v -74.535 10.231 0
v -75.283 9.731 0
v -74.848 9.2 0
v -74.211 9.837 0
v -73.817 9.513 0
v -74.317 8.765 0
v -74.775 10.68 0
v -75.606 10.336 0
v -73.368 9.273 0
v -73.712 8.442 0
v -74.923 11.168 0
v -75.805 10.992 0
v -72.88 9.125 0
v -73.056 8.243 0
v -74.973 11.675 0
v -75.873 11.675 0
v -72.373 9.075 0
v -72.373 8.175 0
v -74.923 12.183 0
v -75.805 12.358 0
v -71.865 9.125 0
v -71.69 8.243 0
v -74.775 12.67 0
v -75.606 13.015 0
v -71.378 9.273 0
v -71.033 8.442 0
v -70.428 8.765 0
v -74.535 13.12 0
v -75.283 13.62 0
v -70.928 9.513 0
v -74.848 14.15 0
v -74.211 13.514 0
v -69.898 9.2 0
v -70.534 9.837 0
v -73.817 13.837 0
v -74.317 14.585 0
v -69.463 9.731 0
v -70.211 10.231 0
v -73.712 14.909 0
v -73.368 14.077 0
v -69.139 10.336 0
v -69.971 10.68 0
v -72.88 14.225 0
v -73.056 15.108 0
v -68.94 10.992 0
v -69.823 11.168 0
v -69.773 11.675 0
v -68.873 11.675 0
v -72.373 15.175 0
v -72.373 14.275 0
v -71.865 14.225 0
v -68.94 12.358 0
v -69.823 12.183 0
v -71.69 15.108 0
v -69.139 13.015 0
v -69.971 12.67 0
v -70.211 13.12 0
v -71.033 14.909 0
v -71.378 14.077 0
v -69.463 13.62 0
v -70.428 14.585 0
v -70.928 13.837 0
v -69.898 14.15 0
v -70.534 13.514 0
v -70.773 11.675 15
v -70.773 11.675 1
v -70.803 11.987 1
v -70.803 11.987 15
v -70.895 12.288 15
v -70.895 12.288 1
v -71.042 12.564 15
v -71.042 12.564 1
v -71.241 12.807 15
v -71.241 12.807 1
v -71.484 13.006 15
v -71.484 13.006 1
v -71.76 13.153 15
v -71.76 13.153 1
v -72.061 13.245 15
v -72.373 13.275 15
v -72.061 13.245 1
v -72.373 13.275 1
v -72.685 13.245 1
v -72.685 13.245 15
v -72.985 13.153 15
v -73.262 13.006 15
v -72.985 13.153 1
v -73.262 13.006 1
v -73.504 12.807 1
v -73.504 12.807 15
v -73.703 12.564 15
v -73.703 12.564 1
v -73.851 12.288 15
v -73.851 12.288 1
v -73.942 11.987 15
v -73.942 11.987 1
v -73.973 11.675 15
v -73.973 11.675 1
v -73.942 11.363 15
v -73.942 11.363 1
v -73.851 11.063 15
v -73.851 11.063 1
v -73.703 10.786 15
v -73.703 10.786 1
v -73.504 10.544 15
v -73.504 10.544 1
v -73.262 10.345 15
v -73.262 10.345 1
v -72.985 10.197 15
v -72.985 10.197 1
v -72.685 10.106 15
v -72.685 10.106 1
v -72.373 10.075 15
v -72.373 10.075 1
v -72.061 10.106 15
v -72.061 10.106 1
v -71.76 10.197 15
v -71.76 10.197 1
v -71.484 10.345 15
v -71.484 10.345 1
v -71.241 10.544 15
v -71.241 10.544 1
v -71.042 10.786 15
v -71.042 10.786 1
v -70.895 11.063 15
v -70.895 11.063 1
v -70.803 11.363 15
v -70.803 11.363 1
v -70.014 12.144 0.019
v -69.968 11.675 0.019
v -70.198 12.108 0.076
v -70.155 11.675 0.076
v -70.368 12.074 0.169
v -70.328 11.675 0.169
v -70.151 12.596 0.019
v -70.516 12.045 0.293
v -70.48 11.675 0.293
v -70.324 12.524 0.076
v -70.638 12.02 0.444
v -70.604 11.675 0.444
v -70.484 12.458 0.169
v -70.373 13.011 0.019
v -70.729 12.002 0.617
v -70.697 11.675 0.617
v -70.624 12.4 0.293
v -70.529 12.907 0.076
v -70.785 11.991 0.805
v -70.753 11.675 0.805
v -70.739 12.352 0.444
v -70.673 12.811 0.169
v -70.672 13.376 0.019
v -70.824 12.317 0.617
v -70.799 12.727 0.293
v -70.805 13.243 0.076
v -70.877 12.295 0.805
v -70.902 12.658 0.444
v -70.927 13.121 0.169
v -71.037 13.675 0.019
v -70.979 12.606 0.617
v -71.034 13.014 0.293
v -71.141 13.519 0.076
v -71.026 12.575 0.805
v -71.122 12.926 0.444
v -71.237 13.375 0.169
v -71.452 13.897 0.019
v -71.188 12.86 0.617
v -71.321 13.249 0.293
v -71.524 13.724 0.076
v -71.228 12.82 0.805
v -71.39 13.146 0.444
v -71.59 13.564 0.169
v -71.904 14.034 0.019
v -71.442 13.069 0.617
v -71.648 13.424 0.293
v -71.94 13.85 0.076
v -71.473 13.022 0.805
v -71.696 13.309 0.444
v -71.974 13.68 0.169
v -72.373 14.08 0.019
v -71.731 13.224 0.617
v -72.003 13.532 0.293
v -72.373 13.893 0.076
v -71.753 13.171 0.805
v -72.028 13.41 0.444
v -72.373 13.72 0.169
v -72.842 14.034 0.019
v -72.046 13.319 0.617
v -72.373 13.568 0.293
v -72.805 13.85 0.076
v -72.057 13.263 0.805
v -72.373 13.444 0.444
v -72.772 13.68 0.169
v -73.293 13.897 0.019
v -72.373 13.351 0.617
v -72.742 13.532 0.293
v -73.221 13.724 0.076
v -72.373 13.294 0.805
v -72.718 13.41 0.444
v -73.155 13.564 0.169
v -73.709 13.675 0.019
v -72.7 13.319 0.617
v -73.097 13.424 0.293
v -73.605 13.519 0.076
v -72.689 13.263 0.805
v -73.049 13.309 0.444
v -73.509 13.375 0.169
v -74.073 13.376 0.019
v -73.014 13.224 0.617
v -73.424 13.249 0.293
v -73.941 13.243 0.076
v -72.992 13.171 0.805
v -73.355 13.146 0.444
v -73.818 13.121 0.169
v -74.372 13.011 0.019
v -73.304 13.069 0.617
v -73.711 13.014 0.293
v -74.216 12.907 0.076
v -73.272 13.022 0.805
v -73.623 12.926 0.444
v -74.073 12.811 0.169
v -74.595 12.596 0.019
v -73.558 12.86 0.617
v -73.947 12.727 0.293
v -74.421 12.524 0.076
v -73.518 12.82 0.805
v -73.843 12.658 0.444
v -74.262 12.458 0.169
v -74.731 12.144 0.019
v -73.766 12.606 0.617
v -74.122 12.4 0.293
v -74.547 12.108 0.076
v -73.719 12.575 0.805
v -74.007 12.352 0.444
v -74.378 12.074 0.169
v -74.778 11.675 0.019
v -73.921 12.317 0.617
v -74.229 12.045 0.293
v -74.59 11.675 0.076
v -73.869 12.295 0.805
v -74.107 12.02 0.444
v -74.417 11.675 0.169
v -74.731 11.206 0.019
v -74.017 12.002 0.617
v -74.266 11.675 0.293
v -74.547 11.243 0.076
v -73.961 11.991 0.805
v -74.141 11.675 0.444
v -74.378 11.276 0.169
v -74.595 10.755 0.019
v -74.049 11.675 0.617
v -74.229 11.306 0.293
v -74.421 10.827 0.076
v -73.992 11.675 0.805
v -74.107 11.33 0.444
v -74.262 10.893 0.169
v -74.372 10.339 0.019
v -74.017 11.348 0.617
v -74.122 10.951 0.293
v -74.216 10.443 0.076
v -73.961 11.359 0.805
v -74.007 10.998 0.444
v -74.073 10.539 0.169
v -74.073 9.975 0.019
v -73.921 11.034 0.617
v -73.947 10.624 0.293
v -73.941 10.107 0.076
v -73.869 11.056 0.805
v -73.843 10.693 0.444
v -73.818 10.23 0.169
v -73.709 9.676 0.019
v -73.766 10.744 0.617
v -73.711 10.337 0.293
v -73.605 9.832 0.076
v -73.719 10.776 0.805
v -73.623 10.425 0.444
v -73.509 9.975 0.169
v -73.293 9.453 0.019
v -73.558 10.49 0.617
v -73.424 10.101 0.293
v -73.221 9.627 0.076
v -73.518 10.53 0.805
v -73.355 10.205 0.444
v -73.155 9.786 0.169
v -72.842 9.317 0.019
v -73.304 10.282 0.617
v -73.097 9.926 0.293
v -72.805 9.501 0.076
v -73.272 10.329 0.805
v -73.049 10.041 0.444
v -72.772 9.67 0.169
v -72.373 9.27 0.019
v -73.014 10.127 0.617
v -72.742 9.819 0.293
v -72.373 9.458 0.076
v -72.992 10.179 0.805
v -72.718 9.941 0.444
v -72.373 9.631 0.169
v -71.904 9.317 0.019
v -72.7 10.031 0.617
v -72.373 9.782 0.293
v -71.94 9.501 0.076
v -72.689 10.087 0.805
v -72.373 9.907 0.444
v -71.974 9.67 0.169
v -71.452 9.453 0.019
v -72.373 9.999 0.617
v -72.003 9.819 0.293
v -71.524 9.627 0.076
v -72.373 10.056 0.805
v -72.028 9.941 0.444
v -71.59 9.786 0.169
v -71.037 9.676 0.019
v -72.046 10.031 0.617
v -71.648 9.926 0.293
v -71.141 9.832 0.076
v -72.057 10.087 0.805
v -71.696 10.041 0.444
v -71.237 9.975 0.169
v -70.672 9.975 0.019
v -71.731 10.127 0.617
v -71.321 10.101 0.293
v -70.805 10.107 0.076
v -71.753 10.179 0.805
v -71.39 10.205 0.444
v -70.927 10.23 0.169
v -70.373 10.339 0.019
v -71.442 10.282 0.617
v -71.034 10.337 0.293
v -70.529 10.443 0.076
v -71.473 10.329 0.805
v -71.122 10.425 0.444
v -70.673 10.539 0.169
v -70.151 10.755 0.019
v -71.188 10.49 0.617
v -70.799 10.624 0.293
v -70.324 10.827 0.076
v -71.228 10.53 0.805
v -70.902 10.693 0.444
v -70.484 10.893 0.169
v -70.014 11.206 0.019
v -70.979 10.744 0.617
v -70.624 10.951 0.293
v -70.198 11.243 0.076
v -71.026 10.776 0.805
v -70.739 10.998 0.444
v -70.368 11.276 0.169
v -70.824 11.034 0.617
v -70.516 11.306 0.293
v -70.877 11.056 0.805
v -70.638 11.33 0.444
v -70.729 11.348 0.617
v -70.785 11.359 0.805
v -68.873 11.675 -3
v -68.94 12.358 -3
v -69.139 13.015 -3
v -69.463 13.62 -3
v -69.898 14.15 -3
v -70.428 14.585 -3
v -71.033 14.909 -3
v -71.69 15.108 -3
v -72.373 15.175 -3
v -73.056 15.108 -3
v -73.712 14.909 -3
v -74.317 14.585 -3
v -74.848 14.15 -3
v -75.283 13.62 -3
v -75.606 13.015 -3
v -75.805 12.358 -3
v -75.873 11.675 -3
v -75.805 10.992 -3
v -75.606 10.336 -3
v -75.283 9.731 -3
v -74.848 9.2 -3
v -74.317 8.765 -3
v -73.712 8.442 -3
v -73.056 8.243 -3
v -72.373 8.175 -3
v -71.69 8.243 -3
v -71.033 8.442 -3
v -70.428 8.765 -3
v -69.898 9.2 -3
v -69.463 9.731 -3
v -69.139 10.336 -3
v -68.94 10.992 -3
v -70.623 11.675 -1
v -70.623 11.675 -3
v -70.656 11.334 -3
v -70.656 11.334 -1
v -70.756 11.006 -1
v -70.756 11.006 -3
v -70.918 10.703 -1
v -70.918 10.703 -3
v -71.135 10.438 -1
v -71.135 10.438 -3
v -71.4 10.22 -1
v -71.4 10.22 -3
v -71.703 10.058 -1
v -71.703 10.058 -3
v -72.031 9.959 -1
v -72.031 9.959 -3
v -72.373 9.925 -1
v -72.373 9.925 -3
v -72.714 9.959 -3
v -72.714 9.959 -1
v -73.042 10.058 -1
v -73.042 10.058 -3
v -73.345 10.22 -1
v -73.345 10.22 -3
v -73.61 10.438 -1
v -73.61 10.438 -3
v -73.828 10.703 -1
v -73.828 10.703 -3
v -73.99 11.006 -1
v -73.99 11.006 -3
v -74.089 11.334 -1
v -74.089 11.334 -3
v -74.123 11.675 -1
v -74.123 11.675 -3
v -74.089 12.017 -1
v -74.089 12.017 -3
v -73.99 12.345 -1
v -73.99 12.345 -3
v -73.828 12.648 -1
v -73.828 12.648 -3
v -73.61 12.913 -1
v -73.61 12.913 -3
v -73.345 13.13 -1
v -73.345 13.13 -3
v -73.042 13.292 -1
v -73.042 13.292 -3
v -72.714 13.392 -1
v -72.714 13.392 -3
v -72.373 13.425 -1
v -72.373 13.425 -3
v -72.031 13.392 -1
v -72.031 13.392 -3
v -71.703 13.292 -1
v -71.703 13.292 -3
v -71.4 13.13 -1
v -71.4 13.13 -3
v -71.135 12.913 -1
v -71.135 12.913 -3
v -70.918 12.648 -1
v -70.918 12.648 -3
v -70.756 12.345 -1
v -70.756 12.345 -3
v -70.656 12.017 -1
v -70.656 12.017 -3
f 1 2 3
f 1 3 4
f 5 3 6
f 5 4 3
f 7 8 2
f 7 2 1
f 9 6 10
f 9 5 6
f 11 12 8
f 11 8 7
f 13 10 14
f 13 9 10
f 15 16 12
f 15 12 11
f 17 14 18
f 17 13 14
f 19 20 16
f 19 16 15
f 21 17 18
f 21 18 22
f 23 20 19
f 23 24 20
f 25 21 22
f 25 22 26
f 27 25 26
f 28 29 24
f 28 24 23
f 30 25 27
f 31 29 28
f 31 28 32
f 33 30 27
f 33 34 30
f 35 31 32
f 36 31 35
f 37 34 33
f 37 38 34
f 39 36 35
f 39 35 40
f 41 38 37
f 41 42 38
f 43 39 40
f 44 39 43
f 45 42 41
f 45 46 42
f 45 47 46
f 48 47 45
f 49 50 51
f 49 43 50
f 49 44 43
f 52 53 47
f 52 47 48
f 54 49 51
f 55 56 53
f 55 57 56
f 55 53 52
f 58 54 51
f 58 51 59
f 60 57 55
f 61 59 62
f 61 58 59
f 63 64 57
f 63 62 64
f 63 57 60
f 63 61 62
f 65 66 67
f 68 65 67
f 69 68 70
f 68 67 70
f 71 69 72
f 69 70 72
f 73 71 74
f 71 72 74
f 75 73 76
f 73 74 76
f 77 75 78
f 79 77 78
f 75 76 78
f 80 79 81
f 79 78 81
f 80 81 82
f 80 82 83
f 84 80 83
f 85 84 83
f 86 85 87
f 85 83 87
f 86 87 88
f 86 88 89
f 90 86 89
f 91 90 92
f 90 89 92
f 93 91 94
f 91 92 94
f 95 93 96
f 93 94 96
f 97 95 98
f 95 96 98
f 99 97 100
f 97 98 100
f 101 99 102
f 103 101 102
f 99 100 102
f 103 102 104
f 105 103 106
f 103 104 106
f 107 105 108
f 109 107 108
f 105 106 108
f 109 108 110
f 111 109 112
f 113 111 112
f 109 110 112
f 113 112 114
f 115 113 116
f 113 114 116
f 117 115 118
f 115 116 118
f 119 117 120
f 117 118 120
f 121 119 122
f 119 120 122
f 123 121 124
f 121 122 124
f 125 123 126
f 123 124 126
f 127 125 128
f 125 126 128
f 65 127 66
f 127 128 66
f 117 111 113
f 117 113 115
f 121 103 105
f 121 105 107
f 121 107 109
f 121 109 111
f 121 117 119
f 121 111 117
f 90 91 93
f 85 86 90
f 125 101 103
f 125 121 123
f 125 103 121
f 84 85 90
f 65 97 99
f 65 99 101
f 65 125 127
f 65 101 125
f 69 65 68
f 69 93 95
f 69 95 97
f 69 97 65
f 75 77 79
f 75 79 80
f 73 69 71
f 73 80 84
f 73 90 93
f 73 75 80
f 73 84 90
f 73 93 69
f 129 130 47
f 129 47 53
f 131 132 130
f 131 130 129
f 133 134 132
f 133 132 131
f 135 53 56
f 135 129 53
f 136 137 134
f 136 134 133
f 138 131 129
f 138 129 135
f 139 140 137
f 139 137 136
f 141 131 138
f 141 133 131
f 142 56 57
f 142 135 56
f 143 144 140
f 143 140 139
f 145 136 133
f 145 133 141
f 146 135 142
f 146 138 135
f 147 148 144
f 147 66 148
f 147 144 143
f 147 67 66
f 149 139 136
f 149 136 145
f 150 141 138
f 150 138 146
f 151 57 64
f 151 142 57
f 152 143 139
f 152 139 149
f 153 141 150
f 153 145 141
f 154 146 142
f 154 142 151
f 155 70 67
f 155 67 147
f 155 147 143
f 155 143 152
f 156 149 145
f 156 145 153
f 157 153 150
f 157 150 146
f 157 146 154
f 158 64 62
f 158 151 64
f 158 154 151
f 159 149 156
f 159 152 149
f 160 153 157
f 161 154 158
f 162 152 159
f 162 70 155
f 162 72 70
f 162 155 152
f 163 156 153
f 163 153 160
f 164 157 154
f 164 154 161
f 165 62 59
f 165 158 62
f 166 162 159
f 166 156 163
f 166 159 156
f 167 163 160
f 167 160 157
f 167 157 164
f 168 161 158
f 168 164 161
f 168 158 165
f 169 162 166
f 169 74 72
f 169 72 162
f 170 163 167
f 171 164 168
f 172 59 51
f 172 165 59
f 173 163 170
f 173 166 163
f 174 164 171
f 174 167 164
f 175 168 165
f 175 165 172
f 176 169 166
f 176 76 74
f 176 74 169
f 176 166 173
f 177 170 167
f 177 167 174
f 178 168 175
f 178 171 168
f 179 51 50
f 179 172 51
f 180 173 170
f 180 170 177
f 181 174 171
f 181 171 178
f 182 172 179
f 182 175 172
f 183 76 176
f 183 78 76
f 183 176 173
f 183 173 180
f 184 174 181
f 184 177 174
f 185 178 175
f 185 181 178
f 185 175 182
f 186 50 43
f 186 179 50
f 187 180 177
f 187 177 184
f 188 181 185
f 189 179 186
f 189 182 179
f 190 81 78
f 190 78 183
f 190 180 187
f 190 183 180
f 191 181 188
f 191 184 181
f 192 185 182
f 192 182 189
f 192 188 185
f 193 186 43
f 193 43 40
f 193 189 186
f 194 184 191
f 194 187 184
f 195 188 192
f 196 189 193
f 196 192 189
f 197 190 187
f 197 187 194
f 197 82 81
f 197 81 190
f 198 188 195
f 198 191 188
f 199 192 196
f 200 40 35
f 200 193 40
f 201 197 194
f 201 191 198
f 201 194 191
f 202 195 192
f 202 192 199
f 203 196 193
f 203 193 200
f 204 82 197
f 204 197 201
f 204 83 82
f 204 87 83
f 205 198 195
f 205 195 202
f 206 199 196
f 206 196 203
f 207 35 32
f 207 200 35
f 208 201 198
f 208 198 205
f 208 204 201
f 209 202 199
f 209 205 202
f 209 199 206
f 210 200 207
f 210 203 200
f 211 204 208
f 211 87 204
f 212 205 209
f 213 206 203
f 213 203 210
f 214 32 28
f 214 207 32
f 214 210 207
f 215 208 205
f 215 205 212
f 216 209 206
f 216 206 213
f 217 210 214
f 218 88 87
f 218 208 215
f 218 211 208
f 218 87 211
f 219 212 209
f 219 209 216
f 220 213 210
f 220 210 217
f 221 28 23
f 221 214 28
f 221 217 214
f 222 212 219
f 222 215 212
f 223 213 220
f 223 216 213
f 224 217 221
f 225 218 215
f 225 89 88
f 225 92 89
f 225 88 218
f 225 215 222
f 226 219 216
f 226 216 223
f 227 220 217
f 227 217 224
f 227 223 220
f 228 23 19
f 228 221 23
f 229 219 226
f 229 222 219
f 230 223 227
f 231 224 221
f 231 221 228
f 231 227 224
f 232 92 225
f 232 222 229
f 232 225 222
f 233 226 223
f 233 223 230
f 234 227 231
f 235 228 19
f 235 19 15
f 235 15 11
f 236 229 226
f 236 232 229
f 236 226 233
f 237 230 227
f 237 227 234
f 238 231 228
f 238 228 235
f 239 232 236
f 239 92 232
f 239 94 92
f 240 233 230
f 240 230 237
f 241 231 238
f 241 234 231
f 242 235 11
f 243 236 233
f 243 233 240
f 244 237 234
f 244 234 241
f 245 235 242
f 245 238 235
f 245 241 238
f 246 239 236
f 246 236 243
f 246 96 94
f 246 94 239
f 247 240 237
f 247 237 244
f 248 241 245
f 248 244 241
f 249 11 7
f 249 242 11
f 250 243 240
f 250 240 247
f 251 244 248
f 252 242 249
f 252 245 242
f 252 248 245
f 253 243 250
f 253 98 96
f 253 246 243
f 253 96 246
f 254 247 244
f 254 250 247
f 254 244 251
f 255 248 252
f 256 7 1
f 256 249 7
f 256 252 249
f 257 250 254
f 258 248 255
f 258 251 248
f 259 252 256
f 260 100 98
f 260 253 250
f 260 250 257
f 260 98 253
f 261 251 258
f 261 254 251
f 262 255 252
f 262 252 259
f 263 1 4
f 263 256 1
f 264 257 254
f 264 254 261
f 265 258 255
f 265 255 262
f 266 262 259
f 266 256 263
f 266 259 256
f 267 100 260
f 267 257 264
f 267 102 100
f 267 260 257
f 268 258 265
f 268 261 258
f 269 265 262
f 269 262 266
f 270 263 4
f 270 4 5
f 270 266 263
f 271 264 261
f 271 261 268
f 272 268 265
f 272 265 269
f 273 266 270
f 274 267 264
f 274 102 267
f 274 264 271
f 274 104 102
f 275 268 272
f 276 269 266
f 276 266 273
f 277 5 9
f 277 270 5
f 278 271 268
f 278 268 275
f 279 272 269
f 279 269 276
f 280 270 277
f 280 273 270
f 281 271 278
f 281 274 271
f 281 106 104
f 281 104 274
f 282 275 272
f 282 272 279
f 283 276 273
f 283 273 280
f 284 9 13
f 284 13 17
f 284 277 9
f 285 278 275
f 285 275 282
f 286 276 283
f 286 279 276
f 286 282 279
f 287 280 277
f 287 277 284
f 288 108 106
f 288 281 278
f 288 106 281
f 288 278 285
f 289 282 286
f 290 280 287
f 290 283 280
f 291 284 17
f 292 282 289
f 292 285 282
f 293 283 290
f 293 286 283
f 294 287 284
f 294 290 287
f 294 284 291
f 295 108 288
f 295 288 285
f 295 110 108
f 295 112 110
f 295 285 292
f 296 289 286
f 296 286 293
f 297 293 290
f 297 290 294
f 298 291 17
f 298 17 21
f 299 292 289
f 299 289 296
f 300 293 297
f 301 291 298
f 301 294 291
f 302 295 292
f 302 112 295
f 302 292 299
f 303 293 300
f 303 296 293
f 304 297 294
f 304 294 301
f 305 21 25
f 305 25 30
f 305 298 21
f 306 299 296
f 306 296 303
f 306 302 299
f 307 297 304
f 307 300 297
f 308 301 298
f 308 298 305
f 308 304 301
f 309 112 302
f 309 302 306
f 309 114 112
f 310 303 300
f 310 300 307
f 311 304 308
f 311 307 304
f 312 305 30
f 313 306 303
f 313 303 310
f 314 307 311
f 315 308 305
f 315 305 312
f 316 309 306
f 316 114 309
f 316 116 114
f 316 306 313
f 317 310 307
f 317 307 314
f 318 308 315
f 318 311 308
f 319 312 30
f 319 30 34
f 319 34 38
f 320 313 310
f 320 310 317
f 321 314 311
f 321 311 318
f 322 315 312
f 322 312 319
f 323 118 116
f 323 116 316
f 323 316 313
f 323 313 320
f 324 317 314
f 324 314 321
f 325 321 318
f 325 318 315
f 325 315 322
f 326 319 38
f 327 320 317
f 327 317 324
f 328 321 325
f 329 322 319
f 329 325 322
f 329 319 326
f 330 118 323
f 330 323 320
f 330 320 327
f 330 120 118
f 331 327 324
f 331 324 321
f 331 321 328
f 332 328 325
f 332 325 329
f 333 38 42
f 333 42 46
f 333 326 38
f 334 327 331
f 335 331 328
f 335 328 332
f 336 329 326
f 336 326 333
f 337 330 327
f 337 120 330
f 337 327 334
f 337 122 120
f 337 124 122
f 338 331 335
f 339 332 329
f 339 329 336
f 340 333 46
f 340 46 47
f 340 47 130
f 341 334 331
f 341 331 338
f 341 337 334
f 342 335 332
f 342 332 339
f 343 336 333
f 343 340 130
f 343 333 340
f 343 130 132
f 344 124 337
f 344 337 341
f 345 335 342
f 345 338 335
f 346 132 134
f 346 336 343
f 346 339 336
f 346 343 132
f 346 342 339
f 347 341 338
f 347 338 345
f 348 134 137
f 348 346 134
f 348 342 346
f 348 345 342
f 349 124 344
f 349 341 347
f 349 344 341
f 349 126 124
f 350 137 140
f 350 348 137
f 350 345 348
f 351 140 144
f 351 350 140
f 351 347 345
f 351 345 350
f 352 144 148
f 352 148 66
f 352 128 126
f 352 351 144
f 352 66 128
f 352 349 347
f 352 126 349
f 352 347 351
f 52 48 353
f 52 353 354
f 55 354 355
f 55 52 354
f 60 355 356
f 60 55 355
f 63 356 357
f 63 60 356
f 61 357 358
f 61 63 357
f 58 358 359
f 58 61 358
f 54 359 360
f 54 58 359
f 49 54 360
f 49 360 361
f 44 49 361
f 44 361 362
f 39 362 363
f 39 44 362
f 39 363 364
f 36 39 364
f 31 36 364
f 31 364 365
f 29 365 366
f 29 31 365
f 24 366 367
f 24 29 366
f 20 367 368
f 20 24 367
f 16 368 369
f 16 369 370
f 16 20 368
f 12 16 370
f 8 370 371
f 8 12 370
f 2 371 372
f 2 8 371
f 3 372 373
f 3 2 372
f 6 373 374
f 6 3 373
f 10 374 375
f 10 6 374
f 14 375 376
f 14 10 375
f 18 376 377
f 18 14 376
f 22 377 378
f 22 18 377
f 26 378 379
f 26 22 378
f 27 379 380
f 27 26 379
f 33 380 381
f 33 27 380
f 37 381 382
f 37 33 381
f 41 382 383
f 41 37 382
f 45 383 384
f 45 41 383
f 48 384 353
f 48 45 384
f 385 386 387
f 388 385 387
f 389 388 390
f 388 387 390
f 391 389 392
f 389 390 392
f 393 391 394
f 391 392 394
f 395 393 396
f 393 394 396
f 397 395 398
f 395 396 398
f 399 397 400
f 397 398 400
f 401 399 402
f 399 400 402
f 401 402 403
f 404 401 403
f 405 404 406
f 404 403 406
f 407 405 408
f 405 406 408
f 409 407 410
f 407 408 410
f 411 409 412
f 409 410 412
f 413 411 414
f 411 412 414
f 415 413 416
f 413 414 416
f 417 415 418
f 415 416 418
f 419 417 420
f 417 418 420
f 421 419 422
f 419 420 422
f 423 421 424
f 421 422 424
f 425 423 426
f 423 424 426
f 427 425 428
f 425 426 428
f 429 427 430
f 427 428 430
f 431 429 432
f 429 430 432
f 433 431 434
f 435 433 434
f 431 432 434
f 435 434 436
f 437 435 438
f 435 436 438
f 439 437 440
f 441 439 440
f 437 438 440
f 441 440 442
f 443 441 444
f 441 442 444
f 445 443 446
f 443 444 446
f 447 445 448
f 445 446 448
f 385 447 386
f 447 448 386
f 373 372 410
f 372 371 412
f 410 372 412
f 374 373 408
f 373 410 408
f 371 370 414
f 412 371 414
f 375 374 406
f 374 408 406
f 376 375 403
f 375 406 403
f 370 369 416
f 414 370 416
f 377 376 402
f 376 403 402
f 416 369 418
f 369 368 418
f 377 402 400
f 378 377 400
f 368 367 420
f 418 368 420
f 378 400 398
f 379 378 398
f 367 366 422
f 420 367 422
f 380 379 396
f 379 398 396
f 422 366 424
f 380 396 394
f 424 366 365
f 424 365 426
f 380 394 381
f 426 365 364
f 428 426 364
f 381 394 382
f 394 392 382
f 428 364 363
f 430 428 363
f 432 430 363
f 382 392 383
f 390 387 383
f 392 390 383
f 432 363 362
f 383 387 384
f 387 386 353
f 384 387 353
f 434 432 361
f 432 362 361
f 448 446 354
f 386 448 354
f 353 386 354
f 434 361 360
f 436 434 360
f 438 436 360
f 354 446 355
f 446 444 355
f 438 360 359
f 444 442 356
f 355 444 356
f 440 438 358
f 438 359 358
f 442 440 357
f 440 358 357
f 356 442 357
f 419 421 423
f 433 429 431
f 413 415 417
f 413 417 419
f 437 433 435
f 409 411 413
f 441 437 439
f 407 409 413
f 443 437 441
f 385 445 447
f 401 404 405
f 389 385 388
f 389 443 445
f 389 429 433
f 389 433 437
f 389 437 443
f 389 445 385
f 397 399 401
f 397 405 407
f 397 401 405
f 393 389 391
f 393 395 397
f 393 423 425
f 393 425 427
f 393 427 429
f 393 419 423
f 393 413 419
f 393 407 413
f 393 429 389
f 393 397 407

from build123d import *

# Parameters (mm, degrees)
SKETCH020_R     = 1.6
PAD015_DEPTH    = 15
SKETCH021_R     = 3.5
PAD016_DEPTH    = 3
SKETCH022_R     = 1.75
POCKET003_DEPTH = 2
FILLET002_R     = 1


with BuildPart() as part:
    # Sketch020 → Pad015 (new body)
    with BuildSketch(Plane.XY):
        with Locations((-72.372711, 11.675275)):
            Circle(SKETCH020_R)
    extrude(amount=PAD015_DEPTH)

    # Sketch021 → Pad016 (join)
    with BuildSketch(Plane.XY):
        with Locations((-72.372711, 11.675275)):
            Circle(SKETCH021_R)
    extrude(amount=-PAD016_DEPTH)

    # Sketch022 (on Face3 of Pad016) → Pocket003 (cut)
    with BuildSketch(Plane(origin=(0, 0, -3), x_dir=(1, 0, 0), z_dir=(0, 0, -1))):
        with Locations((-72.372711, -11.675275)):
            Circle(SKETCH022_R)
    extrude(amount=-POCKET003_DEPTH, mode=Mode.SUBTRACT)

    # Fillet002
    fillet002_edges = [part.edges().sort_by_distance(p)[0] for p in [
        (-73.972711, 11.675275, 0),
    ]]
    fillet(fillet002_edges, radius=FILLET002_R)


solid = part.part
